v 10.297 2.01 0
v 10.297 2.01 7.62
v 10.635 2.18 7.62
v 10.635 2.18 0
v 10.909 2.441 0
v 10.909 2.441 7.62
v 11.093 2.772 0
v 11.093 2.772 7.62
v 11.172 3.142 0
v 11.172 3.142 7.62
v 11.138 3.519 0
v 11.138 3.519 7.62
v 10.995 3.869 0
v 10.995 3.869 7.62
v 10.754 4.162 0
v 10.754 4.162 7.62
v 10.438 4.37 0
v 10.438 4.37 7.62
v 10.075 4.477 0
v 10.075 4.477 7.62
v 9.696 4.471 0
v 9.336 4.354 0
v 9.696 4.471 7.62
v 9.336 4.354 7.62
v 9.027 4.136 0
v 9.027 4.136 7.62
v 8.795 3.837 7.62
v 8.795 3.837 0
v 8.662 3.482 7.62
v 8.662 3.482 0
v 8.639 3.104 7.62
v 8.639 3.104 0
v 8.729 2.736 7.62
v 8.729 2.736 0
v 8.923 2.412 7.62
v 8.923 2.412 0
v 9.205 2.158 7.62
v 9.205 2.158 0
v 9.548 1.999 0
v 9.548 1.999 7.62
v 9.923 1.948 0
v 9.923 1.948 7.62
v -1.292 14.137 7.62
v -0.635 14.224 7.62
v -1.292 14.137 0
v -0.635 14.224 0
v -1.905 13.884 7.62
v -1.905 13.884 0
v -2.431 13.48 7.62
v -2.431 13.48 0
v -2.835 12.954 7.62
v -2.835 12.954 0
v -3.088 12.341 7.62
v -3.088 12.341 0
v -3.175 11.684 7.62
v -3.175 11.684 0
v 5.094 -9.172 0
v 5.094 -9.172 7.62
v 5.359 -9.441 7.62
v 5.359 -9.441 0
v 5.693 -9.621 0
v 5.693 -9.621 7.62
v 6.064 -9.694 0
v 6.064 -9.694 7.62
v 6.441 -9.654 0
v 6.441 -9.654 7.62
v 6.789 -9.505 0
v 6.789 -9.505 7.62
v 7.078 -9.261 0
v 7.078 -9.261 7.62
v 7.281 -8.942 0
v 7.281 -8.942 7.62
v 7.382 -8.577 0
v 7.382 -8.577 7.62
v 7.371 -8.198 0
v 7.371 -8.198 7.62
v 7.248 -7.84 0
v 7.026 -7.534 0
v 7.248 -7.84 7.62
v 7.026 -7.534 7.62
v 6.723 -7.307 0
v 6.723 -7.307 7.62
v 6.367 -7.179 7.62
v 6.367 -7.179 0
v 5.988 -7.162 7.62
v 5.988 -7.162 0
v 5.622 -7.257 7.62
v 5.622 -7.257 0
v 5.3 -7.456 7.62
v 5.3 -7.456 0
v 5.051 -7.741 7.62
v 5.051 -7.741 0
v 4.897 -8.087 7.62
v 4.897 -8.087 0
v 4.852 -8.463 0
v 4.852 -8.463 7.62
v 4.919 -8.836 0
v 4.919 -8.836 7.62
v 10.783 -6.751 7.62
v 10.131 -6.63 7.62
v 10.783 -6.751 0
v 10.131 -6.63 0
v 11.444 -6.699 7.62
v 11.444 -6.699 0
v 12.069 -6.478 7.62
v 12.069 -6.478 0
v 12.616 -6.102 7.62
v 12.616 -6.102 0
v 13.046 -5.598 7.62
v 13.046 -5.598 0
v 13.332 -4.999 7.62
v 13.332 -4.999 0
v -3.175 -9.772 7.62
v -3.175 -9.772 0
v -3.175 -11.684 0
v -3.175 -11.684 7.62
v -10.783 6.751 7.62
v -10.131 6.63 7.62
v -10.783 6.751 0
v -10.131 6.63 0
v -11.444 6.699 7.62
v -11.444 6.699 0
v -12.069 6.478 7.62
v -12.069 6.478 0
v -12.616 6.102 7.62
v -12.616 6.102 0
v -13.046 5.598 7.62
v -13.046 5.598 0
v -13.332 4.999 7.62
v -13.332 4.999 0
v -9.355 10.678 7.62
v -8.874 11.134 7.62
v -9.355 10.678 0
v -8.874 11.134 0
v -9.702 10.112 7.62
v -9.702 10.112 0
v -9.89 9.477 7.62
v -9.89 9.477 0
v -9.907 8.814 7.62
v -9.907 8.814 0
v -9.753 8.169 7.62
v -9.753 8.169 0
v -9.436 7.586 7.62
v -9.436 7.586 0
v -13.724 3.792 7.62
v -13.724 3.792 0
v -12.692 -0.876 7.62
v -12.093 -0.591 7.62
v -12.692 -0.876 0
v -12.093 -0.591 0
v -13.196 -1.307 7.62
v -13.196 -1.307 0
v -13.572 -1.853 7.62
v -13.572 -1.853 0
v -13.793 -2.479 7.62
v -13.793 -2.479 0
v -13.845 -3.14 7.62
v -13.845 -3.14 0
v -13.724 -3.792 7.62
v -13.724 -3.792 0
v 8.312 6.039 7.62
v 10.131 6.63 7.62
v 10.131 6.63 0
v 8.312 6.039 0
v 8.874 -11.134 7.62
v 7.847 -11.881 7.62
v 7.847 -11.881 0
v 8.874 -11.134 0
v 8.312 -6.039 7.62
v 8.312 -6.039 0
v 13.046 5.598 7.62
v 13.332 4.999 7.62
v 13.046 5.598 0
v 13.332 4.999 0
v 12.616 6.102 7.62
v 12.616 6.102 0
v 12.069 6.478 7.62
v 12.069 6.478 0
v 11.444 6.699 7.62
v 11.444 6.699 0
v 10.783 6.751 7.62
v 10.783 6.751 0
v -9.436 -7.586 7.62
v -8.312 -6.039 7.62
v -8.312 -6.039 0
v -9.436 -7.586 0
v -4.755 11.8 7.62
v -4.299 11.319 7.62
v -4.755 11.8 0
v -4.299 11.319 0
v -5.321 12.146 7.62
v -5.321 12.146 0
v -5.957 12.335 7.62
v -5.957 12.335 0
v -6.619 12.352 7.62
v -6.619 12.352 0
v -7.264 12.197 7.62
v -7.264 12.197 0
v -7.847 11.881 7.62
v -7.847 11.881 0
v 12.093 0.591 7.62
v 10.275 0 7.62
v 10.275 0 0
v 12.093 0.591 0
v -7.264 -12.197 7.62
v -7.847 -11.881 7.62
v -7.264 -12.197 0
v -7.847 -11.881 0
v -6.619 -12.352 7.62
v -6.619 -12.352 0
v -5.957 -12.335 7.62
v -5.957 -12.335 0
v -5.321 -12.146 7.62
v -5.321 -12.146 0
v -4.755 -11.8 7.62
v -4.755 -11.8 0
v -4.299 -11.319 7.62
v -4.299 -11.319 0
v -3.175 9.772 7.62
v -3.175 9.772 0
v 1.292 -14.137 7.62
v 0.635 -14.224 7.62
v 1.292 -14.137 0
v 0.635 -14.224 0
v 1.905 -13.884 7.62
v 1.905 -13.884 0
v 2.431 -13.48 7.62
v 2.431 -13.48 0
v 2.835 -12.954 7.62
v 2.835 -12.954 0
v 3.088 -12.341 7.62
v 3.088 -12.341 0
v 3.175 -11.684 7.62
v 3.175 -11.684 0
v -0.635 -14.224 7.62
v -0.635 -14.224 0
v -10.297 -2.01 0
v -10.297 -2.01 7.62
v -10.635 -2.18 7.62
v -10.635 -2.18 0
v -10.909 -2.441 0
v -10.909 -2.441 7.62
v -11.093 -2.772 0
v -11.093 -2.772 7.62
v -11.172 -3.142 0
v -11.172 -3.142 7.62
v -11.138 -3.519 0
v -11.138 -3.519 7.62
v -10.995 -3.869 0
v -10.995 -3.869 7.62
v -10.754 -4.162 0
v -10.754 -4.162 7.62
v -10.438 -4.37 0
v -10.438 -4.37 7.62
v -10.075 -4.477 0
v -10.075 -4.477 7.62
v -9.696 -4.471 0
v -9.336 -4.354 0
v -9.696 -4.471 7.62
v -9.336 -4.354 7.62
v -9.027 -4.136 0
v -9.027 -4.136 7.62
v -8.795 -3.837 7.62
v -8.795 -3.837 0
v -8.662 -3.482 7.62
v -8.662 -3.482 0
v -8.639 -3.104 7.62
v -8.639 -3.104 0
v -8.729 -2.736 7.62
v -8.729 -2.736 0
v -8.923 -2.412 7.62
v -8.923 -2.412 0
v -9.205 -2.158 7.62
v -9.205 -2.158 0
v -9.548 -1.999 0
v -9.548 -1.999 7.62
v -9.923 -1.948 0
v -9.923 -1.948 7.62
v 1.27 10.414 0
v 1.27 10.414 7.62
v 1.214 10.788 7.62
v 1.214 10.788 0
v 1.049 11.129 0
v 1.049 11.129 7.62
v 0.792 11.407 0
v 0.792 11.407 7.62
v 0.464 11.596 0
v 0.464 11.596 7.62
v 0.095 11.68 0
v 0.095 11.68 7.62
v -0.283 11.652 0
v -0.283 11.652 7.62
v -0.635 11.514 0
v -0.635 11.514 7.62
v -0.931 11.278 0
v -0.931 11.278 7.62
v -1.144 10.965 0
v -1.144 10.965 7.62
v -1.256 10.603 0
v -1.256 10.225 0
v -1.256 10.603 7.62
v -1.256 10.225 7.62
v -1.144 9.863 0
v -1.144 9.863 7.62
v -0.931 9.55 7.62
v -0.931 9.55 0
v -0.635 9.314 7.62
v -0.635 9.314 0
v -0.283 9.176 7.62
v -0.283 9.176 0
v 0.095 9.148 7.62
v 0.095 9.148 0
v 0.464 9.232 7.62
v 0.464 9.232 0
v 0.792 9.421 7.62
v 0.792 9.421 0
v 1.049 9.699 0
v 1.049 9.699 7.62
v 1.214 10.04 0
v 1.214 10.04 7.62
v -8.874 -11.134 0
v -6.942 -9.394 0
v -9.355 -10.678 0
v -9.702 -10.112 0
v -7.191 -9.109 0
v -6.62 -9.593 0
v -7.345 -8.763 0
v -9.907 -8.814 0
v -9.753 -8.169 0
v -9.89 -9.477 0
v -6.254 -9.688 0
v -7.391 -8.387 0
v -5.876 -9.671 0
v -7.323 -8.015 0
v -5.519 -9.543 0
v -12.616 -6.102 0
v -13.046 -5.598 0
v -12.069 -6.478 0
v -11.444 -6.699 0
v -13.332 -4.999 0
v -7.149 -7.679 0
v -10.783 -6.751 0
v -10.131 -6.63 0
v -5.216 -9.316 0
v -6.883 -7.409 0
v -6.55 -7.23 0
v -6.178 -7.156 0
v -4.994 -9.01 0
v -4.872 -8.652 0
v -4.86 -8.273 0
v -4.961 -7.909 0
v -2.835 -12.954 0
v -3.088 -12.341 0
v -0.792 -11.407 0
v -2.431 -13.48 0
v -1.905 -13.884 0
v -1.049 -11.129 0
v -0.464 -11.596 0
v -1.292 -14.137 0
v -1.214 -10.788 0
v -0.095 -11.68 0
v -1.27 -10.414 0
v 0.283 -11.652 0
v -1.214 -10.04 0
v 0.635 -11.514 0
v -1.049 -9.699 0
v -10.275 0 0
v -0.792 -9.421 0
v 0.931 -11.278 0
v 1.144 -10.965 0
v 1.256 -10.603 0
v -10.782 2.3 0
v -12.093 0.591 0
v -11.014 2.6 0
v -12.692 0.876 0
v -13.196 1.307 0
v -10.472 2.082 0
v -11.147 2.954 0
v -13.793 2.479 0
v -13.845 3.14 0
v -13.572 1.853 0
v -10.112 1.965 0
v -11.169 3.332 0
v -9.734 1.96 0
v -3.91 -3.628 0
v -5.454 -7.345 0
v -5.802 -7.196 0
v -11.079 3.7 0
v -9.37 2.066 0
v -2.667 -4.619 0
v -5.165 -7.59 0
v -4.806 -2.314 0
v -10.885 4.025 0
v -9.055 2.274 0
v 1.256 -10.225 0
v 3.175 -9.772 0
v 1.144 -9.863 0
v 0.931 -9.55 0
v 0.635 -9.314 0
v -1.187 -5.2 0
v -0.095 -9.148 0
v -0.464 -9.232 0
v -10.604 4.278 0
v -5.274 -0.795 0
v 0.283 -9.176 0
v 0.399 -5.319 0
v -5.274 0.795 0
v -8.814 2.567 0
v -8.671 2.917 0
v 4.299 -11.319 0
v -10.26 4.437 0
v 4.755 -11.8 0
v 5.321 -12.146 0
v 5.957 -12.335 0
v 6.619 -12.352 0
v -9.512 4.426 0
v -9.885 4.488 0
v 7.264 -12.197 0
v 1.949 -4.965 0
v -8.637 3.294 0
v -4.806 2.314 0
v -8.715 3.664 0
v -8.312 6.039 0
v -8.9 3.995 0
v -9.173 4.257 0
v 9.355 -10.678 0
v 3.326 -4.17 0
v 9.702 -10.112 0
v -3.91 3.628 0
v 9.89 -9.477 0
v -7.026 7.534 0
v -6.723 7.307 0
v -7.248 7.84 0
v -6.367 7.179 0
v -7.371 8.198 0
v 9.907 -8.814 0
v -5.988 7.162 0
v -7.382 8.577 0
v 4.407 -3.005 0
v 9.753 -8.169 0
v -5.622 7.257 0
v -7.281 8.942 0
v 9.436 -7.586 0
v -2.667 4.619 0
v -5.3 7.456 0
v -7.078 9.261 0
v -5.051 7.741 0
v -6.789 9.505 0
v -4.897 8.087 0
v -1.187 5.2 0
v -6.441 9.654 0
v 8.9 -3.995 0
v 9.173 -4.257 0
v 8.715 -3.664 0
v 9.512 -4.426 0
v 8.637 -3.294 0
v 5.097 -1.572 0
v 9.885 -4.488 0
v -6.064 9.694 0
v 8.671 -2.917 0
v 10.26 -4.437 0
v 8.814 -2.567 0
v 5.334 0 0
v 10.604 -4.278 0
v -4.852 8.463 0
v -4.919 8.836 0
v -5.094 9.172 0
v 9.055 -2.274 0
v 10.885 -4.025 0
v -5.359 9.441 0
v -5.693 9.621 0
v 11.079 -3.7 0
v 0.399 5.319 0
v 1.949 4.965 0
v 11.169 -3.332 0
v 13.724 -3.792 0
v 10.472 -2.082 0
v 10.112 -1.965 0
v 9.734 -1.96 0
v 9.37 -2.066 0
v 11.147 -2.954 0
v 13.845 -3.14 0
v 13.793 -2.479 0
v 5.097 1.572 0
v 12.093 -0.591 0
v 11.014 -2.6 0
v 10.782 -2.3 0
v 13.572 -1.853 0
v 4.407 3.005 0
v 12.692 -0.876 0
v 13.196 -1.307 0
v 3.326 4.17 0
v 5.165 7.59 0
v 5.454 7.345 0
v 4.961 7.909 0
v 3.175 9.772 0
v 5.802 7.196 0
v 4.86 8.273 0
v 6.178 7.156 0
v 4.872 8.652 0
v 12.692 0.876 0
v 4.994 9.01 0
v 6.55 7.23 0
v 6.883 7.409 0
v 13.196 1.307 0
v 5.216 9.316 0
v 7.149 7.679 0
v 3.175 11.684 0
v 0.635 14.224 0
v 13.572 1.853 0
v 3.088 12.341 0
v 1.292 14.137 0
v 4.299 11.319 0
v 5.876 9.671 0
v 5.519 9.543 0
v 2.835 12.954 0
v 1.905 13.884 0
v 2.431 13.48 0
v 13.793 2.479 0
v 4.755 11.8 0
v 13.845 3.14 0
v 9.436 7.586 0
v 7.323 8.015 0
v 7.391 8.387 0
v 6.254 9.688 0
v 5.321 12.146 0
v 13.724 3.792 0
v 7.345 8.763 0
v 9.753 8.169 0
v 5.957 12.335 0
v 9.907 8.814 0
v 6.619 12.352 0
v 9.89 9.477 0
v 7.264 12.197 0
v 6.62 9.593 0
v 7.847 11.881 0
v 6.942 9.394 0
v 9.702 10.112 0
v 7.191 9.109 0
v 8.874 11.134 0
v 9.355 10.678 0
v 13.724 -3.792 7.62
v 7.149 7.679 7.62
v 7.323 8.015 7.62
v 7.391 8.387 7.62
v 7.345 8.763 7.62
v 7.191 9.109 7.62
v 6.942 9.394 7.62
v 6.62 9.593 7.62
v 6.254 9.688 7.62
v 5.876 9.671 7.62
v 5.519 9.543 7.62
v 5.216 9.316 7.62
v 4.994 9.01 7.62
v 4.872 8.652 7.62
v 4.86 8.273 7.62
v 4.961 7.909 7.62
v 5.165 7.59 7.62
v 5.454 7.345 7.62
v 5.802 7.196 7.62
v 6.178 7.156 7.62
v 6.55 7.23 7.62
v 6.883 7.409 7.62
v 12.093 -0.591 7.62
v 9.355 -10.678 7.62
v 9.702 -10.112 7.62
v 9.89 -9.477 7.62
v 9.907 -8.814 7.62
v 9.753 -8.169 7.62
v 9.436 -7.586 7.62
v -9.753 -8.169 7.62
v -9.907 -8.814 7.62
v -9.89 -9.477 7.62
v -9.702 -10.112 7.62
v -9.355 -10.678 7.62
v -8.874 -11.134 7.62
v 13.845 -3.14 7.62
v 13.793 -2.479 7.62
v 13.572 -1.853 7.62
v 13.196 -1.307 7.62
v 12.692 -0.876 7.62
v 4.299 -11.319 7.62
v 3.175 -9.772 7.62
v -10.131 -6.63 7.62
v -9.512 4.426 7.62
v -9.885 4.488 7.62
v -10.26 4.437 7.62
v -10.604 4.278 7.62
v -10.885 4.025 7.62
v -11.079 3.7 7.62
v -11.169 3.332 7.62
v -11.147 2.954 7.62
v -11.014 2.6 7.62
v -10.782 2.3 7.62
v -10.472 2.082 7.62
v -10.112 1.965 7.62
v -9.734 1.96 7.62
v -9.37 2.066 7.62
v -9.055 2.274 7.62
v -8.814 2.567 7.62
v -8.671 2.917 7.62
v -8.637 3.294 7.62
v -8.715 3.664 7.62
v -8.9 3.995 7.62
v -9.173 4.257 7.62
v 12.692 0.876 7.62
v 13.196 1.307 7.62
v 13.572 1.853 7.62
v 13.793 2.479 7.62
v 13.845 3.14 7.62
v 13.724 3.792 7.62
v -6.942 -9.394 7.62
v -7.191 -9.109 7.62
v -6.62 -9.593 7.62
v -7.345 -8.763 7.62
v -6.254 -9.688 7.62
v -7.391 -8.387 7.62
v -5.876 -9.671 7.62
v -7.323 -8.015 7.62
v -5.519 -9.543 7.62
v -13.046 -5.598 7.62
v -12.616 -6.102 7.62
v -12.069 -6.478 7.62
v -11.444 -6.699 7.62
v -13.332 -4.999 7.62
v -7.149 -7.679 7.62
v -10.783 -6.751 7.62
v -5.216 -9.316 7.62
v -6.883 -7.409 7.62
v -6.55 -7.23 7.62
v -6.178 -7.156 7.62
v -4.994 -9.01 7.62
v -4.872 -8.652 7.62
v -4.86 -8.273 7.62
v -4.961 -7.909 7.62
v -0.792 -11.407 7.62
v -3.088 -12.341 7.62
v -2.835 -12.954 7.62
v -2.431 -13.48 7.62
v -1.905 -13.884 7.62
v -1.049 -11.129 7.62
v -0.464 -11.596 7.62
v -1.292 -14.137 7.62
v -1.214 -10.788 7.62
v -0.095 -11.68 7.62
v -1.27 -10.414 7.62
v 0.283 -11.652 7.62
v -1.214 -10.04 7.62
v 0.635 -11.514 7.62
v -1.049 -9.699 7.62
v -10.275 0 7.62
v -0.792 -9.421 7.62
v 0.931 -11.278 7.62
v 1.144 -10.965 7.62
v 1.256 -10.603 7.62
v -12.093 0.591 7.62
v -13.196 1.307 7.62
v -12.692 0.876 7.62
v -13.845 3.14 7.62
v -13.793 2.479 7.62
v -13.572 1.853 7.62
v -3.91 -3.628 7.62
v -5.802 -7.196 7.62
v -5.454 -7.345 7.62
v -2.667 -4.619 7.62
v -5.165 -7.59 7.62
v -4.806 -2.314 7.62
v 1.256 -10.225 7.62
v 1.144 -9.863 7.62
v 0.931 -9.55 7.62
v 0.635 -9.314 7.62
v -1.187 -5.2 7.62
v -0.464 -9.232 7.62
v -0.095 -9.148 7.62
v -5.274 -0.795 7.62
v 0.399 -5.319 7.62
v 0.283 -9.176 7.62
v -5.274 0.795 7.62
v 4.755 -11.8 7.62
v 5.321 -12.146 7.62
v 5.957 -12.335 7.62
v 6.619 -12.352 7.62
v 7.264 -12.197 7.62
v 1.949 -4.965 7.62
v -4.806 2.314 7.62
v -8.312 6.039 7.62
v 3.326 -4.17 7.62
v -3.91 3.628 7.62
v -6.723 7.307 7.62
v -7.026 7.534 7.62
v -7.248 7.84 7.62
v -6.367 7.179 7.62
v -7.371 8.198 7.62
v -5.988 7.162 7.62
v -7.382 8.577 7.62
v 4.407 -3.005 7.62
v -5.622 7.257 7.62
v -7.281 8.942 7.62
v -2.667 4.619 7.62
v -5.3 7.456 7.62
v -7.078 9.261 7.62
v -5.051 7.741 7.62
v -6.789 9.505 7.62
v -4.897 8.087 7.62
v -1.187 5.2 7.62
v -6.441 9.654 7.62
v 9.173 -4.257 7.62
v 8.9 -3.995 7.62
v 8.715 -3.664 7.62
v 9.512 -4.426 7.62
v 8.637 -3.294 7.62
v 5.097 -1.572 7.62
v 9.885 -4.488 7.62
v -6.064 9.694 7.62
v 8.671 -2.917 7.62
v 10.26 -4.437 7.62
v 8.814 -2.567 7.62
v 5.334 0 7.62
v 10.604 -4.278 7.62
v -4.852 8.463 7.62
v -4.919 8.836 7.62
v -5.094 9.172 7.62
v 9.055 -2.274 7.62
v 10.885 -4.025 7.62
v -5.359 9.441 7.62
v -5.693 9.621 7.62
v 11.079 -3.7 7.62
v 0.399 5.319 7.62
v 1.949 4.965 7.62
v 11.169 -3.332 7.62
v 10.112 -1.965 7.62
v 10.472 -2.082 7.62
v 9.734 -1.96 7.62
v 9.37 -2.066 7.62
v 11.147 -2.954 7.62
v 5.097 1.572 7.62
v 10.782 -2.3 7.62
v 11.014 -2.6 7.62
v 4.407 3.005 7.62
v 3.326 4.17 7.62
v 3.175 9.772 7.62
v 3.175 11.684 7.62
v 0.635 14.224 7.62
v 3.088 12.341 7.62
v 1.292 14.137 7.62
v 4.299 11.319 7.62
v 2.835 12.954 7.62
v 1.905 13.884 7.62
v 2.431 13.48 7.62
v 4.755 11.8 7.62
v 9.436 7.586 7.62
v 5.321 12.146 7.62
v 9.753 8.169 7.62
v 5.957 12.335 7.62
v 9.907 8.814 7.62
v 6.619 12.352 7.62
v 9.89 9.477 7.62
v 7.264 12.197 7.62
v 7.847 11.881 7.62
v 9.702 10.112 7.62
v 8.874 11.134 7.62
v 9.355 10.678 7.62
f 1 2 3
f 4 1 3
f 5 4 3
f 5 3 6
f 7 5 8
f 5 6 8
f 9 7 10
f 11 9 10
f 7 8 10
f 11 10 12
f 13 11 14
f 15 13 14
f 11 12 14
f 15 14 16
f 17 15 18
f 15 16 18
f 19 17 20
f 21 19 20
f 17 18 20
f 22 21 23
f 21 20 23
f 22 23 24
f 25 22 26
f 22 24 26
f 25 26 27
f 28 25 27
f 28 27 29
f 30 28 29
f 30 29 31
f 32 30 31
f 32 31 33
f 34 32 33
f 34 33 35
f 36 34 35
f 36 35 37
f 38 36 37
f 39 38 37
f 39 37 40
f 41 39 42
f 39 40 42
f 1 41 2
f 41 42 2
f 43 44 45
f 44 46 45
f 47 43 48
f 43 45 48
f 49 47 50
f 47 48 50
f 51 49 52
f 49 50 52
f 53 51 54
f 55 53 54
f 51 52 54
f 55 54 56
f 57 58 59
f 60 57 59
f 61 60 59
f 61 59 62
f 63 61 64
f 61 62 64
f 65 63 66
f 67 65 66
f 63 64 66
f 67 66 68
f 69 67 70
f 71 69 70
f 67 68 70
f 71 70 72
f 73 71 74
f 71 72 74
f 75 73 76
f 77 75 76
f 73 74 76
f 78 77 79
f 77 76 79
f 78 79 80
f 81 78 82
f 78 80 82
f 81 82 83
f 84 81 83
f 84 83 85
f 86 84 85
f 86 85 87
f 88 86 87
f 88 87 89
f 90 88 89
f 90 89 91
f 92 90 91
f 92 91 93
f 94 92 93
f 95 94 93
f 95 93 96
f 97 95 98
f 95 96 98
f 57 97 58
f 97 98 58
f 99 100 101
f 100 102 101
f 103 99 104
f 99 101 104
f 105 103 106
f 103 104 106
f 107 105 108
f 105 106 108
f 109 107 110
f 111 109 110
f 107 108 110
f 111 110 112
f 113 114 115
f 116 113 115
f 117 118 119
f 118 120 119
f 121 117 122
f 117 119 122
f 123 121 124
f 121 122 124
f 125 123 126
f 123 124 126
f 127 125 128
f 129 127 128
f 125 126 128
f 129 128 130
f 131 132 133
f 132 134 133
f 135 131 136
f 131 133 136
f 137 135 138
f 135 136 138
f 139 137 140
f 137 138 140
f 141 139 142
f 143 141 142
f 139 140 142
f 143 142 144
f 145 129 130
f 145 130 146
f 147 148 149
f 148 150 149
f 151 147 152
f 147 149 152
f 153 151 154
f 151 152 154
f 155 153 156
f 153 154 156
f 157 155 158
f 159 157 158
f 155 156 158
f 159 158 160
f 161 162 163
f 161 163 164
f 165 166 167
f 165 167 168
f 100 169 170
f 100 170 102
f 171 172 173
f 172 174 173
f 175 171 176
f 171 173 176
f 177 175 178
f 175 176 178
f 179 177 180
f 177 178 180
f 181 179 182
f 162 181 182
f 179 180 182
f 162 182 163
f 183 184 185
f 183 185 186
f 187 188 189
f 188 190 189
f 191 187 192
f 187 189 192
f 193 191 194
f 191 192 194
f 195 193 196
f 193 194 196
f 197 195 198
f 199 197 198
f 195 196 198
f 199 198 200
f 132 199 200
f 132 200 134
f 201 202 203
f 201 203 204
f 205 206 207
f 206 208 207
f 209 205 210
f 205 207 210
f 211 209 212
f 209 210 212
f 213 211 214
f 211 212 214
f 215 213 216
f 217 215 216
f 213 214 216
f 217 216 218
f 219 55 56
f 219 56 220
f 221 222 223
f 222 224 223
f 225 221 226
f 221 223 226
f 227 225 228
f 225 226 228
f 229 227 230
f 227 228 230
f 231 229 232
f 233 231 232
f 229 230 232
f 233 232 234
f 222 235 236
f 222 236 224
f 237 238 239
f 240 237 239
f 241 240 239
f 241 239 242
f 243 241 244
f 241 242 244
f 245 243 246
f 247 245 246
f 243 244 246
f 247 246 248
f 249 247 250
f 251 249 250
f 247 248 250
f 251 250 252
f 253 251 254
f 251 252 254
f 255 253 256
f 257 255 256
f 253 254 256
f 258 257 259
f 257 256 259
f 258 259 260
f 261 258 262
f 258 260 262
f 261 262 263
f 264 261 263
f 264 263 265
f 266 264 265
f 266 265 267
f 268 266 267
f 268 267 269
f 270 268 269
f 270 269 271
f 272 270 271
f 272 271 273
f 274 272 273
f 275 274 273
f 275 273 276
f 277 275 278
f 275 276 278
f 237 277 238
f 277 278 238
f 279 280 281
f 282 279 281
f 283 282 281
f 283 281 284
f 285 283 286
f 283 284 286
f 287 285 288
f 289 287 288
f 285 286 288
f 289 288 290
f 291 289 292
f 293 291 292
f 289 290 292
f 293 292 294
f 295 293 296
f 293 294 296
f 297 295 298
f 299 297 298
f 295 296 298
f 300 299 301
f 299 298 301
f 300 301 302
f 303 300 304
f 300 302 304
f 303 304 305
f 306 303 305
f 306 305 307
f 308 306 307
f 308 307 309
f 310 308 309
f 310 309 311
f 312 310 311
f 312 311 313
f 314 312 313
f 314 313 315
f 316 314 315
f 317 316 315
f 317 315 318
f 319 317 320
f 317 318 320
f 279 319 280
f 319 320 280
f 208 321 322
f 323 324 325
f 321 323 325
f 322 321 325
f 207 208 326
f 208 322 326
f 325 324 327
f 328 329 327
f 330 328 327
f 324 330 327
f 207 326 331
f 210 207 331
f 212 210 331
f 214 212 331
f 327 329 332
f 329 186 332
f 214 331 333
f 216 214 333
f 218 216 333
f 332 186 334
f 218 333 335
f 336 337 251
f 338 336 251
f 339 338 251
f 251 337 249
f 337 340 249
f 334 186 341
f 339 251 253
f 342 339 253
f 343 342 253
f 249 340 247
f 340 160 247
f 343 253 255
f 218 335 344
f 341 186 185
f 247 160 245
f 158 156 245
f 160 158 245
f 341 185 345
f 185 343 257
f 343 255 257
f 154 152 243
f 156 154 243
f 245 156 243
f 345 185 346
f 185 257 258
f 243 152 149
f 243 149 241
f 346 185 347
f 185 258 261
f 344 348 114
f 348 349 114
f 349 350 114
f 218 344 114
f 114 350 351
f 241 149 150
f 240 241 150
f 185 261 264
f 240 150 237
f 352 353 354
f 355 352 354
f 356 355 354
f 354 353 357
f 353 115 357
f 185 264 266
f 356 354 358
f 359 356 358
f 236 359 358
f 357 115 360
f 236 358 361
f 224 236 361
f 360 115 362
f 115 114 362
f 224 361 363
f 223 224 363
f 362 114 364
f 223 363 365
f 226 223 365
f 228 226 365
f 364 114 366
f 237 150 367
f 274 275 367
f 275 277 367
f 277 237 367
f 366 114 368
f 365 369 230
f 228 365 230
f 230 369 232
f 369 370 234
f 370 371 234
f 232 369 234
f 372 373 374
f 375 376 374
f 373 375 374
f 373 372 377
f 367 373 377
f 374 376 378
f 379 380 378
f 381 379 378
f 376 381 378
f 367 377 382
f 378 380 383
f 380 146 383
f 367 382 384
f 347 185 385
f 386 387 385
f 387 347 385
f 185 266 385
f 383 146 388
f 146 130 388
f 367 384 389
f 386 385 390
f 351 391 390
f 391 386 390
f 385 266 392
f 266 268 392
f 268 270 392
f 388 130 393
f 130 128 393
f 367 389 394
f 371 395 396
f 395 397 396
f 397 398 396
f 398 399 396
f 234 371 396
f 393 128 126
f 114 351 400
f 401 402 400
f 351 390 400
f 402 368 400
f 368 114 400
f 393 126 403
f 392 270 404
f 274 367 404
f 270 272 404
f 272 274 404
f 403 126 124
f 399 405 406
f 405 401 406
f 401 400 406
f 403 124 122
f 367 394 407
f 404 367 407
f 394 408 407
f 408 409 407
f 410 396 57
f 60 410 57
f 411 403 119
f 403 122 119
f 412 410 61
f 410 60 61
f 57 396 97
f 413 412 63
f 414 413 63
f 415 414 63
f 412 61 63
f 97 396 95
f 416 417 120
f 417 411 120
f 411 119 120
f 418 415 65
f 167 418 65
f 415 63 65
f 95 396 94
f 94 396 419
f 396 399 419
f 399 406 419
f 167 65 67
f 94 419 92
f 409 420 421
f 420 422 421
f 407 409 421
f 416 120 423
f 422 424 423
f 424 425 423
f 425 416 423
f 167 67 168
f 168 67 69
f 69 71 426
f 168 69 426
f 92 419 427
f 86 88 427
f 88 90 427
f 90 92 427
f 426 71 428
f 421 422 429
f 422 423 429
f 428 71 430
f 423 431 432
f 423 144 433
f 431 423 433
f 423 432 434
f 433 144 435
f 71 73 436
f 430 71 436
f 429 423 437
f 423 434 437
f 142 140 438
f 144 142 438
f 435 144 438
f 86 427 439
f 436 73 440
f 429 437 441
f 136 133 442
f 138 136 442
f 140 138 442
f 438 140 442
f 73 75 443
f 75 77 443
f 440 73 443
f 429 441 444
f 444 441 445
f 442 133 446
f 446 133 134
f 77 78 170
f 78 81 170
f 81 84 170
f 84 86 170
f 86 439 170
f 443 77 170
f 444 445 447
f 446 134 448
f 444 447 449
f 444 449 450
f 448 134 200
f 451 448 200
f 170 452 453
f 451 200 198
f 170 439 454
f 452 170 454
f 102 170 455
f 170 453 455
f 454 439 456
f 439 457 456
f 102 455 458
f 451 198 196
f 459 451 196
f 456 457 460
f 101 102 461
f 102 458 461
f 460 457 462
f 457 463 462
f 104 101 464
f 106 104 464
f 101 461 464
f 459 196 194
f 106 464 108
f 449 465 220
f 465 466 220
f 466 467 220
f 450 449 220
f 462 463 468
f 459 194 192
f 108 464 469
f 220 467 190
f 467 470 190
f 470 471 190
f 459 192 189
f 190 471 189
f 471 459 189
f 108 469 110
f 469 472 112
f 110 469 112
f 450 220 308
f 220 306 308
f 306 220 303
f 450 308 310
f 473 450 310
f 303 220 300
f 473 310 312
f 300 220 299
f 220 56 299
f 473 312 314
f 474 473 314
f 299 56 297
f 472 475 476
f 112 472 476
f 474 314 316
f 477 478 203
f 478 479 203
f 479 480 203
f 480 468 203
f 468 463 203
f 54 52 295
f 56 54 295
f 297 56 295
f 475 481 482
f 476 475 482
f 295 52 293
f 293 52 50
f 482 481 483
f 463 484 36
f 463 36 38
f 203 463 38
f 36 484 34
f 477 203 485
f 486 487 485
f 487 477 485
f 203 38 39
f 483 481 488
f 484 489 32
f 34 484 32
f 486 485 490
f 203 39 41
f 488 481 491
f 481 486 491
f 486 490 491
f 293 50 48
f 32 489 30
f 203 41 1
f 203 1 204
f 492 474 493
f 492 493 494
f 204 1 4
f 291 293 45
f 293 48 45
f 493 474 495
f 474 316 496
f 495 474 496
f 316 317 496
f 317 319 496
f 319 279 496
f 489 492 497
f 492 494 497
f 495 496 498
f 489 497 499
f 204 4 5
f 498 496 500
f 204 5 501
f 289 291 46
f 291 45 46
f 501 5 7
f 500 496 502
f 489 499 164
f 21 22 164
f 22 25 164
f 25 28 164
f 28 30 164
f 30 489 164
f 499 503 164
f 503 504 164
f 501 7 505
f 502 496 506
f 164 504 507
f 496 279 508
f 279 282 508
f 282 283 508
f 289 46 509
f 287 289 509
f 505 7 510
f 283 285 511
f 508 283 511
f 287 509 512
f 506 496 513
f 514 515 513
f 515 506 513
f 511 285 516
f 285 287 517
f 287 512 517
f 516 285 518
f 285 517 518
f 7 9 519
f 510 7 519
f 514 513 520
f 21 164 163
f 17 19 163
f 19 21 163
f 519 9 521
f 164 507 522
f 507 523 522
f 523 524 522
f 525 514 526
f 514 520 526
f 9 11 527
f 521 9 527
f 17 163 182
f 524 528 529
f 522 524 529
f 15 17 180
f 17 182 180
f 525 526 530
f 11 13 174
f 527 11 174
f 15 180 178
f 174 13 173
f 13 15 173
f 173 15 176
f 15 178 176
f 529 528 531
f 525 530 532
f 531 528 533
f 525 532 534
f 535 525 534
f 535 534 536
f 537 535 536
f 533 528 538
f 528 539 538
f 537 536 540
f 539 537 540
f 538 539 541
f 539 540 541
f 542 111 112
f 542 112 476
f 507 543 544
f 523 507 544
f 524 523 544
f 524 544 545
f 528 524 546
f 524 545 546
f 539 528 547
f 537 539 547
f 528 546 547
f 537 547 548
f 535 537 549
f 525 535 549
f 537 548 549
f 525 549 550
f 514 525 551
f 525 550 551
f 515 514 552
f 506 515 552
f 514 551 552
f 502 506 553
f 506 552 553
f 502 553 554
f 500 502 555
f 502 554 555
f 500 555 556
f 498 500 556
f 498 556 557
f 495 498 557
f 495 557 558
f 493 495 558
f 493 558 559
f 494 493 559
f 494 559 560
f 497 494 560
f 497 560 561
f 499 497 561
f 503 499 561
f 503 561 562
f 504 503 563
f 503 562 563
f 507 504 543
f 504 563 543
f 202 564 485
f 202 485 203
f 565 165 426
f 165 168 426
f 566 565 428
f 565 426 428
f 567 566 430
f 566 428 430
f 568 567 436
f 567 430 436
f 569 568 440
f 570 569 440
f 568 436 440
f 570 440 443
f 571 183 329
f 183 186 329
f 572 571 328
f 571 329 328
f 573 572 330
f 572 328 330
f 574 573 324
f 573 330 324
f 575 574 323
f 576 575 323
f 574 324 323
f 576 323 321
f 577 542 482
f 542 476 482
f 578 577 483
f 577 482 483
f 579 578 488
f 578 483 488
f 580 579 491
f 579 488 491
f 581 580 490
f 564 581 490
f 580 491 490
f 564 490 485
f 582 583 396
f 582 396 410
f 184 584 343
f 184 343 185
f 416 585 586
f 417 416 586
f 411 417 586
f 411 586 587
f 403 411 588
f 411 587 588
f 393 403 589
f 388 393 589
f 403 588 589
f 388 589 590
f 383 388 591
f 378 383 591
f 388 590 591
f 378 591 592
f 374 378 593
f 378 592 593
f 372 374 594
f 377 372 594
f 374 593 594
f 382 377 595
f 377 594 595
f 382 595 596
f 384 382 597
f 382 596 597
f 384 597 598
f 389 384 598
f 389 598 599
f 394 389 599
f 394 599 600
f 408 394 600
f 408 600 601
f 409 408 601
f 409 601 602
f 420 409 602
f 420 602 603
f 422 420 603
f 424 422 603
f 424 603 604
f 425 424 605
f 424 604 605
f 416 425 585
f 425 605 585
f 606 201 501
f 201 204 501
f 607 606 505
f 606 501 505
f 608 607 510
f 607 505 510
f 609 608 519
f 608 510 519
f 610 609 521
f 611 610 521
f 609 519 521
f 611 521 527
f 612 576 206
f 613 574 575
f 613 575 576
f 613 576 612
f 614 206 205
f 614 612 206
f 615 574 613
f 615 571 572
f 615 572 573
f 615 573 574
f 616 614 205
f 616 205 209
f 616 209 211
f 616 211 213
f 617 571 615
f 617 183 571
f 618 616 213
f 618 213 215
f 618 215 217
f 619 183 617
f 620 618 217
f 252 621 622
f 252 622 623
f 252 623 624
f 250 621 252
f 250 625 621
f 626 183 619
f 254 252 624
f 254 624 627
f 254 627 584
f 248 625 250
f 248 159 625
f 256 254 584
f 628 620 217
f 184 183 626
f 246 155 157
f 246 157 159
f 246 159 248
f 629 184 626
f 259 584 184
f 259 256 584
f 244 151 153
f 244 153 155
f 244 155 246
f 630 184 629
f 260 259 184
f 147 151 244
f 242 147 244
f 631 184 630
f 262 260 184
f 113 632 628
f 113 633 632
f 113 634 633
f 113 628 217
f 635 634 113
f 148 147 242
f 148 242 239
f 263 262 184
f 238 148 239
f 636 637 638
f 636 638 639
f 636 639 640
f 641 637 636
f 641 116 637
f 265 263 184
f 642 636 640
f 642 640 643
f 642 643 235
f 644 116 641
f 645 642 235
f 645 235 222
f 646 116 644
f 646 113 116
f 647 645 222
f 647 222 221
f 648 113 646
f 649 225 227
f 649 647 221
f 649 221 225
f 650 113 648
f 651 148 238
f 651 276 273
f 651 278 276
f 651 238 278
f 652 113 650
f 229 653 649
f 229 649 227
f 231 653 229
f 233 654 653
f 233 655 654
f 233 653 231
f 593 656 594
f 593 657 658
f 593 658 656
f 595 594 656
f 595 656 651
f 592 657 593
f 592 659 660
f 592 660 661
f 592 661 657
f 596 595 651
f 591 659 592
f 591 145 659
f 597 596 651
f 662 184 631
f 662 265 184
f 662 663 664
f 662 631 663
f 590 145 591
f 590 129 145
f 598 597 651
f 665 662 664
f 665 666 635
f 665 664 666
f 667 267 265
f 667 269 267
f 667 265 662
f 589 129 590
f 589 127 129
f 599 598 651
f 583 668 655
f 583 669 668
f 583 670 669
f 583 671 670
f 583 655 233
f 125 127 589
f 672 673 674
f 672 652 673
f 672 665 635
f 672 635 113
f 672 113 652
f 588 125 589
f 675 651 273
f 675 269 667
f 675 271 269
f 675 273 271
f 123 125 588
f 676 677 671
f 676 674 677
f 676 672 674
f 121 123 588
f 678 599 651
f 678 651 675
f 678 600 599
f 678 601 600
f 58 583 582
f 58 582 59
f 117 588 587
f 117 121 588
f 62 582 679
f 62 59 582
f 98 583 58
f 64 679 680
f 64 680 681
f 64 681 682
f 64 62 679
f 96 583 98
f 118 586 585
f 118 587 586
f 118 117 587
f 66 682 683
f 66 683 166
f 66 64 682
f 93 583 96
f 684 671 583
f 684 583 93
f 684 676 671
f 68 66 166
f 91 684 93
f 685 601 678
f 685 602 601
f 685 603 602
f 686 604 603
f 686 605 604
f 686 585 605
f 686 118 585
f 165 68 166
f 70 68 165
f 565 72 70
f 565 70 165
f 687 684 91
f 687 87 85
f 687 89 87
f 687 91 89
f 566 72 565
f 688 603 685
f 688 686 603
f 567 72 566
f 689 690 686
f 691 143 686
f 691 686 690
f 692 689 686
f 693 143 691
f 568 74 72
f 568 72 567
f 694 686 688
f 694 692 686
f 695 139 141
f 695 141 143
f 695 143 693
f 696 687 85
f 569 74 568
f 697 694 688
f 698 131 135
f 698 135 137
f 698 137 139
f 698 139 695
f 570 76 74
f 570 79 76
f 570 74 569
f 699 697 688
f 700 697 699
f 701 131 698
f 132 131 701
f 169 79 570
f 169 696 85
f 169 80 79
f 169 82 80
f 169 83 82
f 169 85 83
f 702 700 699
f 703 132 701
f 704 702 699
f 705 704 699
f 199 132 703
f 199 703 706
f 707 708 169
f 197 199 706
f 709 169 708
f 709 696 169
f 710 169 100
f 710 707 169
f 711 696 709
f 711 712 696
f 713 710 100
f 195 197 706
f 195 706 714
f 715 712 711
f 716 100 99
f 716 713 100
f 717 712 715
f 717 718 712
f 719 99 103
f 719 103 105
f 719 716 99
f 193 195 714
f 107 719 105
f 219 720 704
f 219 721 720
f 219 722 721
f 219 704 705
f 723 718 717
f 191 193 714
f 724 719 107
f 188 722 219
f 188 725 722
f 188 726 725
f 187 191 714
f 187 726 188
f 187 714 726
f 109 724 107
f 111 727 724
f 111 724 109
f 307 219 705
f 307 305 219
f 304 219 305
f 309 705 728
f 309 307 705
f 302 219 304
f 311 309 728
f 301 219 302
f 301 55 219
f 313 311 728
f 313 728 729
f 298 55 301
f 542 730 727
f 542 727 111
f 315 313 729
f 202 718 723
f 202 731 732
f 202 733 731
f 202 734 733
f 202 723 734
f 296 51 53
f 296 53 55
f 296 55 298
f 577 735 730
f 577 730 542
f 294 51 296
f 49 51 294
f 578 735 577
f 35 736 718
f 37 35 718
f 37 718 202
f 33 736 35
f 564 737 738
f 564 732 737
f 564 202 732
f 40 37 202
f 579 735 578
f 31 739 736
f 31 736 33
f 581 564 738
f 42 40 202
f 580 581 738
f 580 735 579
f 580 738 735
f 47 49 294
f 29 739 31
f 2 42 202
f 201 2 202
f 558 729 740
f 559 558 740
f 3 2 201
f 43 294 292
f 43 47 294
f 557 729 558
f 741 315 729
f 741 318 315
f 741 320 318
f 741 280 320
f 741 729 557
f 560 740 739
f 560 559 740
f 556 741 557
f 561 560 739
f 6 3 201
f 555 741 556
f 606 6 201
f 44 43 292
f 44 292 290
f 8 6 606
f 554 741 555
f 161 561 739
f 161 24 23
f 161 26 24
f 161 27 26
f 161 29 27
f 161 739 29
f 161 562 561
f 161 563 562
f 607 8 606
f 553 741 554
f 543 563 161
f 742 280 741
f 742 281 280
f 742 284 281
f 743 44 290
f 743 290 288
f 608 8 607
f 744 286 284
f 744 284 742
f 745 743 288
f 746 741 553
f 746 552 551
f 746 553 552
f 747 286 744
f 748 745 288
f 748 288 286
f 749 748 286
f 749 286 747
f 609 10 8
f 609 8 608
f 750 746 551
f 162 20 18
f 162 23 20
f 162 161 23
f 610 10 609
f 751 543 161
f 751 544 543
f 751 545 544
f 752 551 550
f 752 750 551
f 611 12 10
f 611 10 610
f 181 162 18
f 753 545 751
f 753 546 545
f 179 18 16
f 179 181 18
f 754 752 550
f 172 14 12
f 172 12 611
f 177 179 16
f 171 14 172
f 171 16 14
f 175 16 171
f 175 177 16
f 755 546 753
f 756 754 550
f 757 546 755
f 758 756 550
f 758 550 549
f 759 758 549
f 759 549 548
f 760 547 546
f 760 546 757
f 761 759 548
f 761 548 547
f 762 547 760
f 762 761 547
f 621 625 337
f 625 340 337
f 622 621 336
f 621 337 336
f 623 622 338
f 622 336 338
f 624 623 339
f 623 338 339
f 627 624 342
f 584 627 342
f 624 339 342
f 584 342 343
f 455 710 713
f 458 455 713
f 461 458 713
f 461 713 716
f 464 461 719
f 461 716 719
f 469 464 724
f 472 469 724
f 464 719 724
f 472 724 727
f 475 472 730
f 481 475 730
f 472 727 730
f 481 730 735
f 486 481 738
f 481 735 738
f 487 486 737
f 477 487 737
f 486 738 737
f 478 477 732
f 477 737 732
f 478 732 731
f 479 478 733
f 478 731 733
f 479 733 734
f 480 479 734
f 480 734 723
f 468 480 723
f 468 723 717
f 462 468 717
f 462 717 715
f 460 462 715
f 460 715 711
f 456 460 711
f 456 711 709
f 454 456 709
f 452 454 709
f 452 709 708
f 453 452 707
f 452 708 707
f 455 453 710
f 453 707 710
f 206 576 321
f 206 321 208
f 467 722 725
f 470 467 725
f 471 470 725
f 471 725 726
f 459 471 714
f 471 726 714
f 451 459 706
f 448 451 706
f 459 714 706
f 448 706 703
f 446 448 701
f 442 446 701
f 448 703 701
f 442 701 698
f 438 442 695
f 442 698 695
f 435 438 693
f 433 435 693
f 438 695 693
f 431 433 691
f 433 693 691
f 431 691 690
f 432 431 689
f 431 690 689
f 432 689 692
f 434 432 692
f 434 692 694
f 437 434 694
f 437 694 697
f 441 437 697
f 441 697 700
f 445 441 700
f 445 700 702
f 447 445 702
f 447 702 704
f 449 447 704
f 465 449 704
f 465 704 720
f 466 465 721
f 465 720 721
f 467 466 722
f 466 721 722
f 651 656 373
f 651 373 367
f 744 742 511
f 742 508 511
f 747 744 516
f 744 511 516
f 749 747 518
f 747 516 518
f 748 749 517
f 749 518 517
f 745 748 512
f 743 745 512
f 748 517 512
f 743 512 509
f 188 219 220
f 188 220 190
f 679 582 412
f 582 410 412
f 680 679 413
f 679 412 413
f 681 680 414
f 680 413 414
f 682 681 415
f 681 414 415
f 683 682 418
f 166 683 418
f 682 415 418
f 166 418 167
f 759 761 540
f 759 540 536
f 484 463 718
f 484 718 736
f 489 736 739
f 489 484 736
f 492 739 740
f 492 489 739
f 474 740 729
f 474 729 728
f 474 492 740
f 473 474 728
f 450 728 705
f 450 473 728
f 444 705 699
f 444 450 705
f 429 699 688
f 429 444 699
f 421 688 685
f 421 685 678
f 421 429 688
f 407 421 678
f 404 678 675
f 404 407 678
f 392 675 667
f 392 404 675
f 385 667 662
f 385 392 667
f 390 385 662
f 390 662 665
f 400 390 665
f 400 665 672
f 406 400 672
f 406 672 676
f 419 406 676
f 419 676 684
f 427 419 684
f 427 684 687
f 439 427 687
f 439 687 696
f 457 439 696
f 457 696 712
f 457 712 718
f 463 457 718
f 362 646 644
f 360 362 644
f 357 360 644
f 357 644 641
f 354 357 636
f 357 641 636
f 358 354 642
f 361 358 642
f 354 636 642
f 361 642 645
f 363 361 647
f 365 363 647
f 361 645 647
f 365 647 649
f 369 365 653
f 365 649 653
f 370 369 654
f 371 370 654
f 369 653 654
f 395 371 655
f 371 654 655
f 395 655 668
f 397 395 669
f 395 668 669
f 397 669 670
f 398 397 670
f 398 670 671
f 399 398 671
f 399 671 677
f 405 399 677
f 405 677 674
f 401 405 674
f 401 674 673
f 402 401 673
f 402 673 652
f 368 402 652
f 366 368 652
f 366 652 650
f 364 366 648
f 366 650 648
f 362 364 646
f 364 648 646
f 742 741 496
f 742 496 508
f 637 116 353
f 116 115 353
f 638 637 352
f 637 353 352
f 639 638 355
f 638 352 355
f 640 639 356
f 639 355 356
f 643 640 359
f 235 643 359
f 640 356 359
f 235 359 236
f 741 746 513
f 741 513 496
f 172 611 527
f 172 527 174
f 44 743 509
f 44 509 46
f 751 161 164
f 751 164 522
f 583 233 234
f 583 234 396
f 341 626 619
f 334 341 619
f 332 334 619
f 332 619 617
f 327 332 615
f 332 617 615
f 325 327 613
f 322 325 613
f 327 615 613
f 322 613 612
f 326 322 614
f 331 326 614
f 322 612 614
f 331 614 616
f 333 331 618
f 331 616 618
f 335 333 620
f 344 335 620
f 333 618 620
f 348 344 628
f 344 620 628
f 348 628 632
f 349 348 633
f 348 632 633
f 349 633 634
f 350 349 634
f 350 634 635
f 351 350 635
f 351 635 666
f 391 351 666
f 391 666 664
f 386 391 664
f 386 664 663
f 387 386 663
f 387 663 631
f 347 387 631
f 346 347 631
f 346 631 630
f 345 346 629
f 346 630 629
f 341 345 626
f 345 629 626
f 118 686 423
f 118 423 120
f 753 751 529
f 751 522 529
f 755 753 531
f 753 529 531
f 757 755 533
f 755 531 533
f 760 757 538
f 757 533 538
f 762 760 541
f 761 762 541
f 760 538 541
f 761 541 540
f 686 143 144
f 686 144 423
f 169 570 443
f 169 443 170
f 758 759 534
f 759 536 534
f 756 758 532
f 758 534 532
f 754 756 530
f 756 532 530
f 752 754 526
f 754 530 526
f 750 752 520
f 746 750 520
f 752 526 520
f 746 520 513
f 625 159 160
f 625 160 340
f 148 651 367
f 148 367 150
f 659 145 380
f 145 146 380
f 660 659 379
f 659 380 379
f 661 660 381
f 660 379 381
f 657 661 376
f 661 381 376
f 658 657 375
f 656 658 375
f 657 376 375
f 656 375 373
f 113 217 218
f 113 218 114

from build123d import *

# Parameters (mm, degrees)
F0_R     = 7.62
F0_R_2   = 5.334
F1_DEPTH = 7.62
F2_R     = 1.27
F3_DEPTH = 7.62
F4_R     = 2.54
F5_COUNT = 10


with BuildPart() as f1:
    # F0 (on Top) → F1 (new body)
    with BuildSketch(Plane.XY):
        Circle(F0_R)
        Circle(F0_R_2, mode=Mode.SUBTRACT)
    extrude(amount=F1_DEPTH)

    # F2 (on face) → F3 (join)
    with BuildSketch(Plane.XY.offset(7.62)):
        with BuildLine():
            ThreePointArc((-3.175, 6.927032), (0, 7.62), (3.175, 6.927032))
            Line((3.175, 6.927032), (3.175, 14.224))
            Line((3.175, 14.224), (-3.175, 14.224))
            Line((-3.175, 14.224), (-3.175, 6.927032))
        make_face()
        with Locations((0, 10.414)):
            Circle(F2_R, mode=Mode.SUBTRACT)
    extrude(amount=-F3_DEPTH)

    # F4
    f4_edges = [f1.edges().sort_by_distance(p)[0] for p in [
        (3.175, 14.224, 3.81),
        (-3.175, 14.224, 3.81),
    ]]
    fillet(f4_edges, radius=F4_R)

    # F5: F1 ×10 about axis
    f5_axis = Axis((0, 0, 0), (0, 0, 1))


with BuildPart() as f1_1:
    add(f1.part)
    for i in range(1, F5_COUNT):
        add(f1.part.rotate(f5_axis, i * 360 / F5_COUNT))


solid = f1_1.part
